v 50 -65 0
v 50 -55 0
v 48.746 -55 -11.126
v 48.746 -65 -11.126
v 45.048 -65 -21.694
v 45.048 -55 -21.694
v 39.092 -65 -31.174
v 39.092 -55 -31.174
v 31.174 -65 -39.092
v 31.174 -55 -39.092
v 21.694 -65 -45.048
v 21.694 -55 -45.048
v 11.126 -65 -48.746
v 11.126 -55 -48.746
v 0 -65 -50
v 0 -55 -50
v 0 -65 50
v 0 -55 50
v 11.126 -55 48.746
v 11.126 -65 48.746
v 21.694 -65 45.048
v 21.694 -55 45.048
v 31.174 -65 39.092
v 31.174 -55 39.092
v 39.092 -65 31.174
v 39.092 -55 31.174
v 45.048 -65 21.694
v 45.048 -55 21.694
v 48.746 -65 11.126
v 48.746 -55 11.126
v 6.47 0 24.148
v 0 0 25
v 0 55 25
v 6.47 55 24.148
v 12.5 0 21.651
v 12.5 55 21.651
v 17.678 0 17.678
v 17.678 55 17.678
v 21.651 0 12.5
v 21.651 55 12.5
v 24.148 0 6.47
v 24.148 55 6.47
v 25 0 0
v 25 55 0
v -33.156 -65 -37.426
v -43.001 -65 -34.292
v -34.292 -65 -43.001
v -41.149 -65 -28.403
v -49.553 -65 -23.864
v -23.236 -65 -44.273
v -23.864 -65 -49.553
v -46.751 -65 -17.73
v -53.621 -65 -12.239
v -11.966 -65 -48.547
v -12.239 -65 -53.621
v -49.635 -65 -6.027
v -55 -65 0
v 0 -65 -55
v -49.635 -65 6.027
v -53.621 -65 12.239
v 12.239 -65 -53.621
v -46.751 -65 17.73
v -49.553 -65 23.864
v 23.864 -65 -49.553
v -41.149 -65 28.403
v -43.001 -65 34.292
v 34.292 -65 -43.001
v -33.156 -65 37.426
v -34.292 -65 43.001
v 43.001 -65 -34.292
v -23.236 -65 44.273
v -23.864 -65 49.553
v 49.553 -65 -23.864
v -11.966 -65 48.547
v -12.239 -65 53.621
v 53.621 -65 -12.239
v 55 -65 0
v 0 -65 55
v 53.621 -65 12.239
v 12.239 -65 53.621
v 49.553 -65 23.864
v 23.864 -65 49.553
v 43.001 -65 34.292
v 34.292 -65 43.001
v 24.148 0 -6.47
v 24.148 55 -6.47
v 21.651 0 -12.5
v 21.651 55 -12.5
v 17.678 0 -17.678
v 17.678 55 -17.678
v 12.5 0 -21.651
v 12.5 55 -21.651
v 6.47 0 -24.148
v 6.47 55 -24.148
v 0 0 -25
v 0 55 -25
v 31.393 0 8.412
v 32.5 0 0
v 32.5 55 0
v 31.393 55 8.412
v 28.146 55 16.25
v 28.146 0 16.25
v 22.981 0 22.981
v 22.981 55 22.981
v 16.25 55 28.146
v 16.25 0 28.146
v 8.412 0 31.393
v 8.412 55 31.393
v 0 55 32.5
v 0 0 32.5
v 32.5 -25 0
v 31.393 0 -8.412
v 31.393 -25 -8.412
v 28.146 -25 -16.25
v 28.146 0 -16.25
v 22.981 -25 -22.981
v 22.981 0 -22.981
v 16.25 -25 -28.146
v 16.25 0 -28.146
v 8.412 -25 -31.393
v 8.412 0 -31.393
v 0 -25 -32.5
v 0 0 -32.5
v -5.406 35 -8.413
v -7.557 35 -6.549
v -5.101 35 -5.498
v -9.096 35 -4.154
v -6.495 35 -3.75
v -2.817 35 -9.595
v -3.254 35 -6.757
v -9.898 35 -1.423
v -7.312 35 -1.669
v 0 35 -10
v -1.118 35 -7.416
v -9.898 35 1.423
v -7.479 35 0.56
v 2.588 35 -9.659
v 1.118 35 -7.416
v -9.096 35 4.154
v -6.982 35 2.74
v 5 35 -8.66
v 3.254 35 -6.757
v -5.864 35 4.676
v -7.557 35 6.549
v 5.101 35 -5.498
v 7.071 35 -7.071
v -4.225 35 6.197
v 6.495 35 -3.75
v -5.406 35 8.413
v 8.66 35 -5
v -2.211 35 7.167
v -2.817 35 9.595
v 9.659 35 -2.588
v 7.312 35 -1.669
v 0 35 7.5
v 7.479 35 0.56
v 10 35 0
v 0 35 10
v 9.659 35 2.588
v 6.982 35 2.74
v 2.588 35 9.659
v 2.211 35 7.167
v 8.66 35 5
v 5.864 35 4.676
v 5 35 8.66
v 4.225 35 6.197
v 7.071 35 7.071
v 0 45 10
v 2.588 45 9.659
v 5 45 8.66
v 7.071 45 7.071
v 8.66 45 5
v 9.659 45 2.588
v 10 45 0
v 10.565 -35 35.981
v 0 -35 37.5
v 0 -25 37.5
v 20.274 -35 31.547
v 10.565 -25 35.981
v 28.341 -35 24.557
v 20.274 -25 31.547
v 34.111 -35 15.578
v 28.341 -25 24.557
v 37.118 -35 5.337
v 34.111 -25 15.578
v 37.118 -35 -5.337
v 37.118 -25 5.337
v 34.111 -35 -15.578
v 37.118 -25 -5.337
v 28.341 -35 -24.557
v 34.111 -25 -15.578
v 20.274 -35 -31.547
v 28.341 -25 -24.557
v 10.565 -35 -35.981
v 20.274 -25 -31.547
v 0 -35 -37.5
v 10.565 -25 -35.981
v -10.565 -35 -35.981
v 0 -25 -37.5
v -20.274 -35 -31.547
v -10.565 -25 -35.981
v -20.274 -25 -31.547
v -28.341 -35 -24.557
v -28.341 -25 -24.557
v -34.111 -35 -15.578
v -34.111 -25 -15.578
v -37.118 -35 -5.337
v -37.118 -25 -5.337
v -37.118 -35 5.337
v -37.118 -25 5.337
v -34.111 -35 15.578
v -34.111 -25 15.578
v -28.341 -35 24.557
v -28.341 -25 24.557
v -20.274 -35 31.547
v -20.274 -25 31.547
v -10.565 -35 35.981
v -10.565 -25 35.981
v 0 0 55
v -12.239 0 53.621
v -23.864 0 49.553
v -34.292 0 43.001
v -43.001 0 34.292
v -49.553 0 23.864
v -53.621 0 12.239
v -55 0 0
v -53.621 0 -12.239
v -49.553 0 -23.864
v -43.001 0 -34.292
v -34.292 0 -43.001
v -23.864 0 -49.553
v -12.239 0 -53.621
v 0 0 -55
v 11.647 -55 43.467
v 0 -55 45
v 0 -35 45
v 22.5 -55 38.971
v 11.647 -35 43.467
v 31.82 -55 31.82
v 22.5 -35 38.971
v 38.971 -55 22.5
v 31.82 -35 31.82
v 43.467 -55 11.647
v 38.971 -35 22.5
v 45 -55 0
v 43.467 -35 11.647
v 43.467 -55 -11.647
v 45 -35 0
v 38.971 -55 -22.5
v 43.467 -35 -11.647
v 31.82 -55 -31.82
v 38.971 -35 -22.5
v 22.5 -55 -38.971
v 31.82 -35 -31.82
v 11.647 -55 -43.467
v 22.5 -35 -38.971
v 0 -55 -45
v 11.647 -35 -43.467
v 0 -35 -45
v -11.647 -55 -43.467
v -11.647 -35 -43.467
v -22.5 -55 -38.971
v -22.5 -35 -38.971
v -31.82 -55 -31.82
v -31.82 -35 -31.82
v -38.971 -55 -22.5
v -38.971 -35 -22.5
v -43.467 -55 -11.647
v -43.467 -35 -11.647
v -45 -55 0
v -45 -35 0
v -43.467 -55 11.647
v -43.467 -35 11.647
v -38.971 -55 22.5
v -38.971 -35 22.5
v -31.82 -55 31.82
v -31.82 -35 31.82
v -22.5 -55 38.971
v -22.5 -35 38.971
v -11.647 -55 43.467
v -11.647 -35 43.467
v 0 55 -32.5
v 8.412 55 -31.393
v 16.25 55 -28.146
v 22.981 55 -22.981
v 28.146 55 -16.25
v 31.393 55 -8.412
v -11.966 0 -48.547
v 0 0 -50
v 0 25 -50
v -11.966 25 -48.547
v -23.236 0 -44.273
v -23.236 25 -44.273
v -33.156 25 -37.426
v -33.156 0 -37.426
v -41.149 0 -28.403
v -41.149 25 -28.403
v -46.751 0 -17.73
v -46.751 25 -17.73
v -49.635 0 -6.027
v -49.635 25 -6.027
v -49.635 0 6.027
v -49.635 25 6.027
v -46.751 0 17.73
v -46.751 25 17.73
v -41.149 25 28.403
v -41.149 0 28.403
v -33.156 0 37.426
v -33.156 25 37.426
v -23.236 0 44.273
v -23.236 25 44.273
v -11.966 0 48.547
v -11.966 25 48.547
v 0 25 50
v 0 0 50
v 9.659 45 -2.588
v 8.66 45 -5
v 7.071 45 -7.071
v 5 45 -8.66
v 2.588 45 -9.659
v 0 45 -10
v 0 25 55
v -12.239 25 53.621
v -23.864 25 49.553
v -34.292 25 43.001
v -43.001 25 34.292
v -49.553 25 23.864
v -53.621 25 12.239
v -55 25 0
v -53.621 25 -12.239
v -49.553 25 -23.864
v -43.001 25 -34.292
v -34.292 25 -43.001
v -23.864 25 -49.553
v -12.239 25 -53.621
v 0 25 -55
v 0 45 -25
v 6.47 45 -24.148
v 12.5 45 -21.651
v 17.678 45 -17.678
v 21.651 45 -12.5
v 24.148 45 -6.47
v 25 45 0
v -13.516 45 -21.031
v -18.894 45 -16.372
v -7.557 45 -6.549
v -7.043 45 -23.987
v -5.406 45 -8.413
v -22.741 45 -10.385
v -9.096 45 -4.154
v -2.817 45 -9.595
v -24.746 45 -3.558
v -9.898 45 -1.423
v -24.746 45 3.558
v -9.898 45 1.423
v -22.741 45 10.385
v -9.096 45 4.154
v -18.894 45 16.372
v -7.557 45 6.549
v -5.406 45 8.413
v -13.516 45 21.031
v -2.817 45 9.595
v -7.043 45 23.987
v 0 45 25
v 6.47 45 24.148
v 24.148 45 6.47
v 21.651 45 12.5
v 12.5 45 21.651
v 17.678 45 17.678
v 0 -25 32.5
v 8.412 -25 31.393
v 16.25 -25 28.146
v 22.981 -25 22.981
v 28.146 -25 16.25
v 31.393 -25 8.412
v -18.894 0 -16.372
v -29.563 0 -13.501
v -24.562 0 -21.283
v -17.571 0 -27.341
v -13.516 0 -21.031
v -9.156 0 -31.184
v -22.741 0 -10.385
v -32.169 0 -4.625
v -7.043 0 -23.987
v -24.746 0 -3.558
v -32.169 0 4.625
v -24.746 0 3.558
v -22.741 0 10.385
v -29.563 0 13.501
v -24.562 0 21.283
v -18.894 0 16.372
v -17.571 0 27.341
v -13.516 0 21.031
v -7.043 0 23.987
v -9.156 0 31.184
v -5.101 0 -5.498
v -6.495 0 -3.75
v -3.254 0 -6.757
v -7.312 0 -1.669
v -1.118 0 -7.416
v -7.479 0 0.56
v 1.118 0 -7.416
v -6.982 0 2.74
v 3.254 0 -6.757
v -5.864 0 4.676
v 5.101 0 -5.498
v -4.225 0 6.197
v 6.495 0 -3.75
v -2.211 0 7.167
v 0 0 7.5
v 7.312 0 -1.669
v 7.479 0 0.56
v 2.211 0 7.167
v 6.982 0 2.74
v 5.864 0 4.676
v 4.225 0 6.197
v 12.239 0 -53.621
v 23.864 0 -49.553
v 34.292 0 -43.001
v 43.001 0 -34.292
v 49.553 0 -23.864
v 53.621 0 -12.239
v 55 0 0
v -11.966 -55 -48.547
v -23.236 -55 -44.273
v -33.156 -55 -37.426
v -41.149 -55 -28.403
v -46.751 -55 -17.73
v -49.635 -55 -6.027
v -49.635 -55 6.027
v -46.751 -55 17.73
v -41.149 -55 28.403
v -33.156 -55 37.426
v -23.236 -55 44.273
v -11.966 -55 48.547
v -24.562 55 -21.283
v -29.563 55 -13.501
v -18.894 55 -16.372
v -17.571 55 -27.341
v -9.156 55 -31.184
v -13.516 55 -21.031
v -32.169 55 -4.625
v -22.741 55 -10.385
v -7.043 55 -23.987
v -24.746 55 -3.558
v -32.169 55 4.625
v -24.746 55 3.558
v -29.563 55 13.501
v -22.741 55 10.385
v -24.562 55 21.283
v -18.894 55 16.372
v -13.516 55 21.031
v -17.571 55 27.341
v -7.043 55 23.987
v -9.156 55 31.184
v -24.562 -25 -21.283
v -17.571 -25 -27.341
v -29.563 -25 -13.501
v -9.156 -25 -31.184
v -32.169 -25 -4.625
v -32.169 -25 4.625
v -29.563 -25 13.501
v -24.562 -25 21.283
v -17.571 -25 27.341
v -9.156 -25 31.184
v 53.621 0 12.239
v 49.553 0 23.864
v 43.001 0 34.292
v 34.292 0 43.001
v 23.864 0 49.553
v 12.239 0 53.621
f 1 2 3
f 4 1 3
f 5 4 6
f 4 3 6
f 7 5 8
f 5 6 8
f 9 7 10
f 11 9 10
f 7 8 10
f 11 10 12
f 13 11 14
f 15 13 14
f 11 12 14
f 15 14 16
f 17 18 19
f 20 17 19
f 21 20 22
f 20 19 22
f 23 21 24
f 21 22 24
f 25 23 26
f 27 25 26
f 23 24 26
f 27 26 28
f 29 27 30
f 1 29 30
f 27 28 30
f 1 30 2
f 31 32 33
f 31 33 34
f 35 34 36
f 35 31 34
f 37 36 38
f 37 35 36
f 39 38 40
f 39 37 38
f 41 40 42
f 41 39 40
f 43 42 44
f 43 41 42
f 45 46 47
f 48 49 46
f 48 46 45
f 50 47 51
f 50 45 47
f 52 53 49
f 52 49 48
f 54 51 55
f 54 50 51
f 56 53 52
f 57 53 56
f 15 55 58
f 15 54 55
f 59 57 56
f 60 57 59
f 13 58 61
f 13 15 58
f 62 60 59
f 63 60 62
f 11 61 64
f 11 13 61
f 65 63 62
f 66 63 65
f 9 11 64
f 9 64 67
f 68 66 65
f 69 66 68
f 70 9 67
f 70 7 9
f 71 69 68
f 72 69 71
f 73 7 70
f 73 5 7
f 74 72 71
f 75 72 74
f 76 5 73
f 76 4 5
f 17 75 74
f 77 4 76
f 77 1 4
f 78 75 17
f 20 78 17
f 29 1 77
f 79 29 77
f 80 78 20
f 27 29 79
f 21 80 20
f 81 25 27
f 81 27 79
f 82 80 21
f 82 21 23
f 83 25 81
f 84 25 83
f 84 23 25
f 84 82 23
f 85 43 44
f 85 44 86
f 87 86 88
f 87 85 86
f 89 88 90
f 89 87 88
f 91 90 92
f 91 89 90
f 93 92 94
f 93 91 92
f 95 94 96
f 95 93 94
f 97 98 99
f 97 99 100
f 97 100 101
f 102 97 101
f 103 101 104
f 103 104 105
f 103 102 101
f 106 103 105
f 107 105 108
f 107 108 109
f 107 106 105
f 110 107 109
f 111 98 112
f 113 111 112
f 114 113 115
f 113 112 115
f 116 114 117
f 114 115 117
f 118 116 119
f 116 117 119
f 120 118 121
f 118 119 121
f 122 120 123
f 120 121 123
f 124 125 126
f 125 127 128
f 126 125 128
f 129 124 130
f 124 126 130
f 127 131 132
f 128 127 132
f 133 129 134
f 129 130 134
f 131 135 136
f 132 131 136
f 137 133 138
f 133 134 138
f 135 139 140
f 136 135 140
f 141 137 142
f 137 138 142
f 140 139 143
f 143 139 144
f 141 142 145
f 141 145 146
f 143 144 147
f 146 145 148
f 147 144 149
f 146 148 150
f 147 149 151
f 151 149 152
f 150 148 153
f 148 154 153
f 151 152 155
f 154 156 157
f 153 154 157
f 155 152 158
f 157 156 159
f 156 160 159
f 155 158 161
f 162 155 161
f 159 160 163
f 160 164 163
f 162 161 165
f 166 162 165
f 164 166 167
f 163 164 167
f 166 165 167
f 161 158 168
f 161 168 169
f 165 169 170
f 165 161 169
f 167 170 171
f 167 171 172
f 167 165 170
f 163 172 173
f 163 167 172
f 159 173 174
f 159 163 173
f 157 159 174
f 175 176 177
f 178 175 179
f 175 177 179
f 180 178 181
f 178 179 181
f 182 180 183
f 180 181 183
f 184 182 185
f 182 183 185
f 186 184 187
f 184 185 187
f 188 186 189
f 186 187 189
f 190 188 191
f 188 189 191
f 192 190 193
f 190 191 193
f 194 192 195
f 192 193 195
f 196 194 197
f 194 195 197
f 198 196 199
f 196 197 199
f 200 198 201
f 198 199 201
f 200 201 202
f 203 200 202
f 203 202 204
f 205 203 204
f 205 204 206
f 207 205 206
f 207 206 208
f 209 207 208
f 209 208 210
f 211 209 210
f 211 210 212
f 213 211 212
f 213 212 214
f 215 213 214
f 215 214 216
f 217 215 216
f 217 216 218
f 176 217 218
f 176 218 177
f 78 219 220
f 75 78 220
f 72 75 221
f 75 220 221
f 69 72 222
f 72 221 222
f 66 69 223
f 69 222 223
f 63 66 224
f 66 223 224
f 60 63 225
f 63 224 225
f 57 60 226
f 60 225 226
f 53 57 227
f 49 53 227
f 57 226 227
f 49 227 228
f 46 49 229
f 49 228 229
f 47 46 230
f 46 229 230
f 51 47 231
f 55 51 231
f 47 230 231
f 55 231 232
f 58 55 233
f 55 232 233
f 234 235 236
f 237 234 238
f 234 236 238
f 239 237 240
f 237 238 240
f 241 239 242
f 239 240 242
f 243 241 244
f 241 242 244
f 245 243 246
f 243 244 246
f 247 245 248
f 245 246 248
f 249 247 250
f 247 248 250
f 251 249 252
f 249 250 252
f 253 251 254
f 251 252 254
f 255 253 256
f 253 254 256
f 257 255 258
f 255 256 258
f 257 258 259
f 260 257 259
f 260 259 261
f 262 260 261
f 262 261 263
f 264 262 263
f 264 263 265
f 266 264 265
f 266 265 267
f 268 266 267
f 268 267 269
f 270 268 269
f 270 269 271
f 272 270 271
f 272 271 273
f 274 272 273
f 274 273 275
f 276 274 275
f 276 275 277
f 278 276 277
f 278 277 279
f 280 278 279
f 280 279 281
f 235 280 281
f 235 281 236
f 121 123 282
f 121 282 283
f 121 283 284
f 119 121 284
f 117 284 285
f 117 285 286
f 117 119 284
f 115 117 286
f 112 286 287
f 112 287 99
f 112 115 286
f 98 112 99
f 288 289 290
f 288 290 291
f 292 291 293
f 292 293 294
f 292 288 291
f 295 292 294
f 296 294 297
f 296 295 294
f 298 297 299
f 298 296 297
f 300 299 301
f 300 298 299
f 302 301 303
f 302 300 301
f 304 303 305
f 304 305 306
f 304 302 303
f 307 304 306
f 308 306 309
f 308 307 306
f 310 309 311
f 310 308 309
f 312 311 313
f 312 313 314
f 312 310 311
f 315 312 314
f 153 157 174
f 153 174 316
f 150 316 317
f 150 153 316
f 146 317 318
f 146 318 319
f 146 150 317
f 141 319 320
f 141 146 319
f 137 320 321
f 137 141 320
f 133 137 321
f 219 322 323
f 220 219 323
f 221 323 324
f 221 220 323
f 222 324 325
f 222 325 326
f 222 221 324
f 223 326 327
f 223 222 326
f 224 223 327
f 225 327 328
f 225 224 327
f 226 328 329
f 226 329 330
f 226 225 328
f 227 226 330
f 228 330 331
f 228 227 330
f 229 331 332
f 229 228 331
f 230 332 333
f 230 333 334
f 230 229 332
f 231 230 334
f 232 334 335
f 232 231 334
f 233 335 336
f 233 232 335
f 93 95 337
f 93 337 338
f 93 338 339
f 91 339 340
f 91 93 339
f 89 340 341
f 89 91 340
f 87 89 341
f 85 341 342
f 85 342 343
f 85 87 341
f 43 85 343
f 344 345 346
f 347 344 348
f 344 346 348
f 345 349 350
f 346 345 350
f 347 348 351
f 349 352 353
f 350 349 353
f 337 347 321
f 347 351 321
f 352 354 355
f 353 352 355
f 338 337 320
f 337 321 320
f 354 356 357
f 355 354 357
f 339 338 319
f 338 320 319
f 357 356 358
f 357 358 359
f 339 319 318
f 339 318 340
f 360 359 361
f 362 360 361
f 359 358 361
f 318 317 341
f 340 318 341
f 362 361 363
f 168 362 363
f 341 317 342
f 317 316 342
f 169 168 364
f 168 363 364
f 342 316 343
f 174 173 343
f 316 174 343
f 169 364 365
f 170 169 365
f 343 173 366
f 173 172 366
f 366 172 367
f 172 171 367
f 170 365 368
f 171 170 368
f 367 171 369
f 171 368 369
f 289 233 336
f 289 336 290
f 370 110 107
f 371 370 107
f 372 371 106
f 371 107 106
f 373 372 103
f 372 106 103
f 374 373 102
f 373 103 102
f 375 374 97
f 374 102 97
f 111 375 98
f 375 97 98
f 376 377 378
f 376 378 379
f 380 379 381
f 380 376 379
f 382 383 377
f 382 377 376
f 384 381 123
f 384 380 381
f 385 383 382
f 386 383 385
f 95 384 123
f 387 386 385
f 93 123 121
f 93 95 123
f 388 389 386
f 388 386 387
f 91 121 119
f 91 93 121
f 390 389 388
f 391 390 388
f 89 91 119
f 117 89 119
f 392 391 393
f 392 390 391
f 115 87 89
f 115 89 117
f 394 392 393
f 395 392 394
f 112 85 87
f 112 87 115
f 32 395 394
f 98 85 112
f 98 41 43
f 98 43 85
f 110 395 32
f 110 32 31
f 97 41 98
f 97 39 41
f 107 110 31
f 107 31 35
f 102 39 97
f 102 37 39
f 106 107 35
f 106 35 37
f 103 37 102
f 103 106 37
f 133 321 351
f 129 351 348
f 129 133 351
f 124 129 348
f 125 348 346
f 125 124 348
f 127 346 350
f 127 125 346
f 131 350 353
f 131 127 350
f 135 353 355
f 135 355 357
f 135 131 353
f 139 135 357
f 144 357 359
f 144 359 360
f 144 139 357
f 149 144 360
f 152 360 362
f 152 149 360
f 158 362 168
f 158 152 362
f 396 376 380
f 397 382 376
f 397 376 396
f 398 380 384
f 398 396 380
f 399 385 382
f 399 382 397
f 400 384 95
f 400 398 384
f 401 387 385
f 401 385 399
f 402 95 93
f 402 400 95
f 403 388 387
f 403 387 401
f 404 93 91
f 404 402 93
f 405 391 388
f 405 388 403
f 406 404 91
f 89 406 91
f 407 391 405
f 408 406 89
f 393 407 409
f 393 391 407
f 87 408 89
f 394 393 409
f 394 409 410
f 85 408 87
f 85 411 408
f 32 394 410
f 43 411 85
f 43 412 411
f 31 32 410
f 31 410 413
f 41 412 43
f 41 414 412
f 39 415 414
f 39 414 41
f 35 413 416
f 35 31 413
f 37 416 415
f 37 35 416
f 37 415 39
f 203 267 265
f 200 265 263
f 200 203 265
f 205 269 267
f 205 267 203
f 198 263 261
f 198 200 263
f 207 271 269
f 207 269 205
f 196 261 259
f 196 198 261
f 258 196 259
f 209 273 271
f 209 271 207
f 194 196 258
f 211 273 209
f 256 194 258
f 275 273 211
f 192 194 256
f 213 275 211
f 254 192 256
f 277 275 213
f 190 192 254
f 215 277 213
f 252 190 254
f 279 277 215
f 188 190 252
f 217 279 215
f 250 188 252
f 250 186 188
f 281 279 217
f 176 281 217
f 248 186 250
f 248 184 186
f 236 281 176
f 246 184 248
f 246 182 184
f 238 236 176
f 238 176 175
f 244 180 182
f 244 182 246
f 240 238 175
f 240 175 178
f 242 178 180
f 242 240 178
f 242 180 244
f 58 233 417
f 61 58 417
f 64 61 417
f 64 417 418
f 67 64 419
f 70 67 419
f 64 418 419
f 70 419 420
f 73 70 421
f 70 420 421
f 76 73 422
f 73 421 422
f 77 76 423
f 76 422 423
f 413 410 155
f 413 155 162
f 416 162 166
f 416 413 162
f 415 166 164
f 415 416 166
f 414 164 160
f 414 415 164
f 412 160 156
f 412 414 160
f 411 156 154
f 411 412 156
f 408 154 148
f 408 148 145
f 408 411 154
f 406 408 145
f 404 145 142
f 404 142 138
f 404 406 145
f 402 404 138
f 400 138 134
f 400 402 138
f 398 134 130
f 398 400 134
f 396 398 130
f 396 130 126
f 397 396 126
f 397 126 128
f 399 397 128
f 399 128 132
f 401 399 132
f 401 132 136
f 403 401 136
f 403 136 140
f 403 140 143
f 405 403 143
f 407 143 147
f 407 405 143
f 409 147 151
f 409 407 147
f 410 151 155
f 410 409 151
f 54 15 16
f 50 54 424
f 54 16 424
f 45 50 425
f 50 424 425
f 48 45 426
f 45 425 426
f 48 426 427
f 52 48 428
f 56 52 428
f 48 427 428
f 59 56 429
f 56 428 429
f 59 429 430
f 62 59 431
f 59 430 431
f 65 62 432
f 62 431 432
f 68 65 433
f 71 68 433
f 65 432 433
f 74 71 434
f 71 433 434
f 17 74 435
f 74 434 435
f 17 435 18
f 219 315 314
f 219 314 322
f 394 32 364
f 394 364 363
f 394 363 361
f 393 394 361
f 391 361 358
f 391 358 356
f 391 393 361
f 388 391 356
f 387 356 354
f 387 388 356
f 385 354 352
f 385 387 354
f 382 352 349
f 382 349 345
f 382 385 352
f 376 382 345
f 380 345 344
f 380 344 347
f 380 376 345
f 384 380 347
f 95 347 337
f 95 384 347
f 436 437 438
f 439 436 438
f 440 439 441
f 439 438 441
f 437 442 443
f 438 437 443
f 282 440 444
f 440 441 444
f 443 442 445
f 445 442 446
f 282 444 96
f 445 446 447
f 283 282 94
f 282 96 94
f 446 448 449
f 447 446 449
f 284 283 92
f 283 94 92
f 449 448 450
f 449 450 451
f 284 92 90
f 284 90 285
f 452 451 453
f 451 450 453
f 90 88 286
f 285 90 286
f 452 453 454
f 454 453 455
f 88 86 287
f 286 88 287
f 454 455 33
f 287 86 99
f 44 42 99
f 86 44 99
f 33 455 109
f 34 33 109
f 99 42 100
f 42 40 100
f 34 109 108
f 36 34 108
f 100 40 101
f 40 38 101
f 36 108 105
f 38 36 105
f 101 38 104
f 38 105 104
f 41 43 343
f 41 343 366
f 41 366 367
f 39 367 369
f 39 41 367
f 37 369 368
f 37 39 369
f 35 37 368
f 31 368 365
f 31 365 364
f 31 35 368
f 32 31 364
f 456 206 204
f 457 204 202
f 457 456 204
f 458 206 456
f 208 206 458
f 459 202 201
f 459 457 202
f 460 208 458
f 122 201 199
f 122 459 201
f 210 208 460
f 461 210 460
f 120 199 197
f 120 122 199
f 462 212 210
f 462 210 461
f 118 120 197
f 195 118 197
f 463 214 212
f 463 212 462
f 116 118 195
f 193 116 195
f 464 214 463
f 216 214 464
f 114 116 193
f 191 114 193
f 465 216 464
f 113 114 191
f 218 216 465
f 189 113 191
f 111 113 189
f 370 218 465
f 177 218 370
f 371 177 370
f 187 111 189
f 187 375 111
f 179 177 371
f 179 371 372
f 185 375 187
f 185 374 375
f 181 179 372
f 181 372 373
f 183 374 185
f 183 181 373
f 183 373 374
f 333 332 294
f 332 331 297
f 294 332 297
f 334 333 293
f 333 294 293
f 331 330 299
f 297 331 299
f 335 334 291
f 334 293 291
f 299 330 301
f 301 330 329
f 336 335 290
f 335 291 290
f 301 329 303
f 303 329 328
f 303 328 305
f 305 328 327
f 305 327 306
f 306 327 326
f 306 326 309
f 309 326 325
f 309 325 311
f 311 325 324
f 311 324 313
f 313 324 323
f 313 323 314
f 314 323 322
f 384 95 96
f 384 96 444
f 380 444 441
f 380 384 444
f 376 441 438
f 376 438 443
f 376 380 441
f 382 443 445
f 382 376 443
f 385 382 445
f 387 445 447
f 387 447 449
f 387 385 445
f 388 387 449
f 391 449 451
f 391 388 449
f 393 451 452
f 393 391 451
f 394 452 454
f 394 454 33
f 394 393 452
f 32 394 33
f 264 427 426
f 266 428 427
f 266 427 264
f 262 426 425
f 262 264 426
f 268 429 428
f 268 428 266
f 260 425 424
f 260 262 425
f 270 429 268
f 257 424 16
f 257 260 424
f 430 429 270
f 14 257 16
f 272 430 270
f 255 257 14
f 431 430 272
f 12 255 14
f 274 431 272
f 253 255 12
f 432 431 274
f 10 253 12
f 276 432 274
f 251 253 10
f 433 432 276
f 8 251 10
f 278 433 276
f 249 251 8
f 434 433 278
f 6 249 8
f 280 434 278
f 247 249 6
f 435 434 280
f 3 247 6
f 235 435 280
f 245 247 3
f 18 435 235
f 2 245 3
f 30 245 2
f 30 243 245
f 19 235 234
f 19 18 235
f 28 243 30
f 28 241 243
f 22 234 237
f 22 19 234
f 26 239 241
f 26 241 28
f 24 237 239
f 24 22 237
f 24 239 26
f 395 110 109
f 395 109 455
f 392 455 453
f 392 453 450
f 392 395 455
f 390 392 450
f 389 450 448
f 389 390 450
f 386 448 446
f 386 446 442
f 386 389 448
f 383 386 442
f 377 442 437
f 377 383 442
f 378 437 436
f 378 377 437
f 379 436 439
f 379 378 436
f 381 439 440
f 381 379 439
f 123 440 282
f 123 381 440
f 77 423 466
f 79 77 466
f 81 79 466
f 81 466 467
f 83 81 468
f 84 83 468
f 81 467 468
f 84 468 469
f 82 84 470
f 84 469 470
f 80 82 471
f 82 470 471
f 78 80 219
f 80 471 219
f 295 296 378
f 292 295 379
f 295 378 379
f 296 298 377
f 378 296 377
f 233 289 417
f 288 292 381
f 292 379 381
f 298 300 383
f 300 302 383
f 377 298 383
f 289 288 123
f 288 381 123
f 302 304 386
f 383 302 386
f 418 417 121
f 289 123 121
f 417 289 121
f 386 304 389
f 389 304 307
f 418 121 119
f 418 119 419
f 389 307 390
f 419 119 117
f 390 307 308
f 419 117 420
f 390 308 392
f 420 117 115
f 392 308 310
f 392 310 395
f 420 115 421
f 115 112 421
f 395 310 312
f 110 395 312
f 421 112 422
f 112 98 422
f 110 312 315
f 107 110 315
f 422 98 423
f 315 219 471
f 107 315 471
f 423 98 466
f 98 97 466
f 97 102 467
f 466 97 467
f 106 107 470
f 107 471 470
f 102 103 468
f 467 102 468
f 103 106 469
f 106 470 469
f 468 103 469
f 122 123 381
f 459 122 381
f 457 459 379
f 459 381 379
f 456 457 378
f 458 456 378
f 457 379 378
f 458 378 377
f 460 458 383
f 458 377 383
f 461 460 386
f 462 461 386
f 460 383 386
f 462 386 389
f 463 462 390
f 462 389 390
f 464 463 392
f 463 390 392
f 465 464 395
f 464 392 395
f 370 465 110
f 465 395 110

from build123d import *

# Parameters (mm, degrees)
F1_DEPTH = 35
F2_DEPTH = 45
F3_DEPTH = 55
F4_DEPTH = 25
F5_DEPTH = 35
F6_DEPTH = 55
F7_DEPTH = 65
F8_DEPTH = 25


with BuildPart() as f1:
    # F0 (on Front) → F1 (new body)
    with BuildSketch(Plane.XZ):
        with BuildLine():
            Line((0, 7.5), (0, 10))
            ThreePointArc((0, 10), (-10, 0), (0, -10))
            Line((0, -10), (0, -7.5))
            ThreePointArc((0, -7.5), (-7.5, 0), (0, 7.5))
        make_face()
        with BuildLine():
            ThreePointArc((10, 0), (7.0710678119, 7.0710678119), (0, 10))
            Line((0, 10), (0, 7.5))
            ThreePointArc((0, 7.5), (5.3033008589, 5.3033008589), (7.5, 0))
            ThreePointArc((7.5, 0), (5.3033008589, -5.3033008589), (0, -7.5))
            Line((0, -7.5), (0, -10))
            ThreePointArc((0, -10), (7.0710678119, -7.0710678119), (10, 0))
        make_face()
    extrude(amount=-F1_DEPTH)

    # F0 (on Front) → F2 (join)
    with BuildSketch(Plane.XZ):
        with BuildLine():
            Line((0, 10), (0, 25))
            ThreePointArc((0, 25), (-25, 0), (0, -25))
            Line((0, -25), (0, -10))
            ThreePointArc((0, -10), (-10, 0), (0, 10))
        make_face()
        with BuildLine():
            ThreePointArc((25, 0), (17.6776695297, 17.6776695297), (0, 25))
            Line((0, 25), (0, 10))
            ThreePointArc((0, 10), (7.0710678119, 7.0710678119), (10, 0))
            ThreePointArc((10, 0), (7.0710678119, -7.0710678119), (0, -10))
            Line((0, -10), (0, -25))
            ThreePointArc((0, -25), (17.6776695297, -17.6776695297), (25, 0))
        make_face()
    extrude(amount=-F2_DEPTH)


with BuildPart() as f3:
    # F0 (on Front) → F3 (new body)
    with BuildSketch(Plane.XZ):
        with BuildLine():
            Line((0, 25), (0, 32.5))
            ThreePointArc((0, 32.5), (-32.5, 0), (0, -32.5))
            Line((0, -32.5), (0, -25))
            ThreePointArc((0, -25), (-25, 0), (0, 25))
        make_face()
        with BuildLine():
            ThreePointArc((32.5, 0), (22.9809703886, 22.9809703886), (0, 32.5))
            Line((0, 32.5), (0, 25))
            ThreePointArc((0, 25), (17.6776695297, 17.6776695297), (25, 0))
            ThreePointArc((25, 0), (17.6776695297, -17.6776695297), (0, -25))
            Line((0, -25), (0, -32.5))
            ThreePointArc((0, -32.5), (22.9809703886, -22.9809703886), (32.5, 0))
        make_face()
    extrude(amount=-F3_DEPTH)


with BuildPart() as f4:
    # F0 (on Front) → F4 (new body)
    with BuildSketch(Plane.XZ):
        with BuildLine():
            Line((0, 32.5), (0, 37.5))
            ThreePointArc((0, 37.5), (-37.5, 0), (0, -37.5))
            Line((0, -37.5), (0, -32.5))
            ThreePointArc((0, -32.5), (-32.5, 0), (0, 32.5))
        make_face()
        with BuildLine():
            ThreePointArc((37.5, 0), (26.5165042945, 26.5165042945), (0, 37.5))
            Line((0, 37.5), (0, 32.5))
            ThreePointArc((0, 32.5), (22.9809703886, 22.9809703886), (32.5, 0))
            ThreePointArc((32.5, 0), (22.9809703886, -22.9809703886), (0, -32.5))
            Line((0, -32.5), (0, -37.5))
            ThreePointArc((0, -37.5), (26.5165042945, -26.5165042945), (37.5, 0))
        make_face()
    extrude(amount=F4_DEPTH)

    # F0 (on Front) → F5 (join)
    with BuildSketch(Plane.XZ):
        with BuildLine():
            Line((0, 37.5), (0, 45))
            ThreePointArc((0, 45), (-45, 0), (0, -45))
            Line((0, -45), (0, -37.5))
            ThreePointArc((0, -37.5), (-37.5, 0), (0, 37.5))
        make_face()
        with BuildLine():
            ThreePointArc((45, 0), (31.8198051534, 31.8198051534), (0, 45))
            Line((0, 45), (0, 37.5))
            ThreePointArc((0, 37.5), (26.5165042945, 26.5165042945), (37.5, 0))
            ThreePointArc((37.5, 0), (26.5165042945, -26.5165042945), (0, -37.5))
            Line((0, -37.5), (0, -45))
            ThreePointArc((0, -45), (31.8198051534, -31.8198051534), (45, 0))
        make_face()
    extrude(amount=F5_DEPTH)

    # F0 (on Front) → F6 (join)
    with BuildSketch(Plane.XZ):
        with BuildLine():
            Line((0, 45), (0, 50))
            ThreePointArc((0, 50), (-50, 0), (0, -50))
            Line((0, -50), (0, -45))
            ThreePointArc((0, -45), (-45, 0), (0, 45))
        make_face()
        with BuildLine():
            ThreePointArc((50, 0), (35.3553390593, 35.3553390593), (0, 50))
            Line((0, 50), (0, 45))
            ThreePointArc((0, 45), (31.8198051534, 31.8198051534), (45, 0))
            ThreePointArc((45, 0), (31.8198051534, -31.8198051534), (0, -45))
            Line((0, -45), (0, -50))
            ThreePointArc((0, -50), (35.3553390593, -35.3553390593), (50, 0))
        make_face()
    extrude(amount=F6_DEPTH)

    # F0 (on Front) → F7 (join)
    with BuildSketch(Plane.XZ):
        with BuildLine():
            Line((0, 50), (0, 55))
            ThreePointArc((0, 55), (-55, 0), (0, -55))
            Line((0, -55), (0, -50))
            ThreePointArc((0, -50), (-50, 0), (0, 50))
        make_face()
        with BuildLine():
            ThreePointArc((0, -55), (38.8908729653, -38.8908729653), (55, 0))
            ThreePointArc((55, 0), (38.8908729653, 38.8908729653), (0, 55))
            Line((0, 55), (0, 50))
            ThreePointArc((0, 50), (35.3553390593, 35.3553390593), (50, 0))
            ThreePointArc((50, 0), (35.3553390593, -35.3553390593), (0, -50))
            Line((0, -50), (0, -55))
        make_face()
    extrude(amount=F7_DEPTH)

    # F0 (on Front) → F8 (join)
    with BuildSketch(Plane.XZ):
        with BuildLine():
            Line((0, 50), (0, 55))
            ThreePointArc((0, 55), (-55, 0), (0, -55))
            Line((0, -55), (0, -50))
            ThreePointArc((0, -50), (-50, 0), (0, 50))
        make_face()
    extrude(amount=-F8_DEPTH)


solid = Compound([f1.part, f3.part, f4.part])
